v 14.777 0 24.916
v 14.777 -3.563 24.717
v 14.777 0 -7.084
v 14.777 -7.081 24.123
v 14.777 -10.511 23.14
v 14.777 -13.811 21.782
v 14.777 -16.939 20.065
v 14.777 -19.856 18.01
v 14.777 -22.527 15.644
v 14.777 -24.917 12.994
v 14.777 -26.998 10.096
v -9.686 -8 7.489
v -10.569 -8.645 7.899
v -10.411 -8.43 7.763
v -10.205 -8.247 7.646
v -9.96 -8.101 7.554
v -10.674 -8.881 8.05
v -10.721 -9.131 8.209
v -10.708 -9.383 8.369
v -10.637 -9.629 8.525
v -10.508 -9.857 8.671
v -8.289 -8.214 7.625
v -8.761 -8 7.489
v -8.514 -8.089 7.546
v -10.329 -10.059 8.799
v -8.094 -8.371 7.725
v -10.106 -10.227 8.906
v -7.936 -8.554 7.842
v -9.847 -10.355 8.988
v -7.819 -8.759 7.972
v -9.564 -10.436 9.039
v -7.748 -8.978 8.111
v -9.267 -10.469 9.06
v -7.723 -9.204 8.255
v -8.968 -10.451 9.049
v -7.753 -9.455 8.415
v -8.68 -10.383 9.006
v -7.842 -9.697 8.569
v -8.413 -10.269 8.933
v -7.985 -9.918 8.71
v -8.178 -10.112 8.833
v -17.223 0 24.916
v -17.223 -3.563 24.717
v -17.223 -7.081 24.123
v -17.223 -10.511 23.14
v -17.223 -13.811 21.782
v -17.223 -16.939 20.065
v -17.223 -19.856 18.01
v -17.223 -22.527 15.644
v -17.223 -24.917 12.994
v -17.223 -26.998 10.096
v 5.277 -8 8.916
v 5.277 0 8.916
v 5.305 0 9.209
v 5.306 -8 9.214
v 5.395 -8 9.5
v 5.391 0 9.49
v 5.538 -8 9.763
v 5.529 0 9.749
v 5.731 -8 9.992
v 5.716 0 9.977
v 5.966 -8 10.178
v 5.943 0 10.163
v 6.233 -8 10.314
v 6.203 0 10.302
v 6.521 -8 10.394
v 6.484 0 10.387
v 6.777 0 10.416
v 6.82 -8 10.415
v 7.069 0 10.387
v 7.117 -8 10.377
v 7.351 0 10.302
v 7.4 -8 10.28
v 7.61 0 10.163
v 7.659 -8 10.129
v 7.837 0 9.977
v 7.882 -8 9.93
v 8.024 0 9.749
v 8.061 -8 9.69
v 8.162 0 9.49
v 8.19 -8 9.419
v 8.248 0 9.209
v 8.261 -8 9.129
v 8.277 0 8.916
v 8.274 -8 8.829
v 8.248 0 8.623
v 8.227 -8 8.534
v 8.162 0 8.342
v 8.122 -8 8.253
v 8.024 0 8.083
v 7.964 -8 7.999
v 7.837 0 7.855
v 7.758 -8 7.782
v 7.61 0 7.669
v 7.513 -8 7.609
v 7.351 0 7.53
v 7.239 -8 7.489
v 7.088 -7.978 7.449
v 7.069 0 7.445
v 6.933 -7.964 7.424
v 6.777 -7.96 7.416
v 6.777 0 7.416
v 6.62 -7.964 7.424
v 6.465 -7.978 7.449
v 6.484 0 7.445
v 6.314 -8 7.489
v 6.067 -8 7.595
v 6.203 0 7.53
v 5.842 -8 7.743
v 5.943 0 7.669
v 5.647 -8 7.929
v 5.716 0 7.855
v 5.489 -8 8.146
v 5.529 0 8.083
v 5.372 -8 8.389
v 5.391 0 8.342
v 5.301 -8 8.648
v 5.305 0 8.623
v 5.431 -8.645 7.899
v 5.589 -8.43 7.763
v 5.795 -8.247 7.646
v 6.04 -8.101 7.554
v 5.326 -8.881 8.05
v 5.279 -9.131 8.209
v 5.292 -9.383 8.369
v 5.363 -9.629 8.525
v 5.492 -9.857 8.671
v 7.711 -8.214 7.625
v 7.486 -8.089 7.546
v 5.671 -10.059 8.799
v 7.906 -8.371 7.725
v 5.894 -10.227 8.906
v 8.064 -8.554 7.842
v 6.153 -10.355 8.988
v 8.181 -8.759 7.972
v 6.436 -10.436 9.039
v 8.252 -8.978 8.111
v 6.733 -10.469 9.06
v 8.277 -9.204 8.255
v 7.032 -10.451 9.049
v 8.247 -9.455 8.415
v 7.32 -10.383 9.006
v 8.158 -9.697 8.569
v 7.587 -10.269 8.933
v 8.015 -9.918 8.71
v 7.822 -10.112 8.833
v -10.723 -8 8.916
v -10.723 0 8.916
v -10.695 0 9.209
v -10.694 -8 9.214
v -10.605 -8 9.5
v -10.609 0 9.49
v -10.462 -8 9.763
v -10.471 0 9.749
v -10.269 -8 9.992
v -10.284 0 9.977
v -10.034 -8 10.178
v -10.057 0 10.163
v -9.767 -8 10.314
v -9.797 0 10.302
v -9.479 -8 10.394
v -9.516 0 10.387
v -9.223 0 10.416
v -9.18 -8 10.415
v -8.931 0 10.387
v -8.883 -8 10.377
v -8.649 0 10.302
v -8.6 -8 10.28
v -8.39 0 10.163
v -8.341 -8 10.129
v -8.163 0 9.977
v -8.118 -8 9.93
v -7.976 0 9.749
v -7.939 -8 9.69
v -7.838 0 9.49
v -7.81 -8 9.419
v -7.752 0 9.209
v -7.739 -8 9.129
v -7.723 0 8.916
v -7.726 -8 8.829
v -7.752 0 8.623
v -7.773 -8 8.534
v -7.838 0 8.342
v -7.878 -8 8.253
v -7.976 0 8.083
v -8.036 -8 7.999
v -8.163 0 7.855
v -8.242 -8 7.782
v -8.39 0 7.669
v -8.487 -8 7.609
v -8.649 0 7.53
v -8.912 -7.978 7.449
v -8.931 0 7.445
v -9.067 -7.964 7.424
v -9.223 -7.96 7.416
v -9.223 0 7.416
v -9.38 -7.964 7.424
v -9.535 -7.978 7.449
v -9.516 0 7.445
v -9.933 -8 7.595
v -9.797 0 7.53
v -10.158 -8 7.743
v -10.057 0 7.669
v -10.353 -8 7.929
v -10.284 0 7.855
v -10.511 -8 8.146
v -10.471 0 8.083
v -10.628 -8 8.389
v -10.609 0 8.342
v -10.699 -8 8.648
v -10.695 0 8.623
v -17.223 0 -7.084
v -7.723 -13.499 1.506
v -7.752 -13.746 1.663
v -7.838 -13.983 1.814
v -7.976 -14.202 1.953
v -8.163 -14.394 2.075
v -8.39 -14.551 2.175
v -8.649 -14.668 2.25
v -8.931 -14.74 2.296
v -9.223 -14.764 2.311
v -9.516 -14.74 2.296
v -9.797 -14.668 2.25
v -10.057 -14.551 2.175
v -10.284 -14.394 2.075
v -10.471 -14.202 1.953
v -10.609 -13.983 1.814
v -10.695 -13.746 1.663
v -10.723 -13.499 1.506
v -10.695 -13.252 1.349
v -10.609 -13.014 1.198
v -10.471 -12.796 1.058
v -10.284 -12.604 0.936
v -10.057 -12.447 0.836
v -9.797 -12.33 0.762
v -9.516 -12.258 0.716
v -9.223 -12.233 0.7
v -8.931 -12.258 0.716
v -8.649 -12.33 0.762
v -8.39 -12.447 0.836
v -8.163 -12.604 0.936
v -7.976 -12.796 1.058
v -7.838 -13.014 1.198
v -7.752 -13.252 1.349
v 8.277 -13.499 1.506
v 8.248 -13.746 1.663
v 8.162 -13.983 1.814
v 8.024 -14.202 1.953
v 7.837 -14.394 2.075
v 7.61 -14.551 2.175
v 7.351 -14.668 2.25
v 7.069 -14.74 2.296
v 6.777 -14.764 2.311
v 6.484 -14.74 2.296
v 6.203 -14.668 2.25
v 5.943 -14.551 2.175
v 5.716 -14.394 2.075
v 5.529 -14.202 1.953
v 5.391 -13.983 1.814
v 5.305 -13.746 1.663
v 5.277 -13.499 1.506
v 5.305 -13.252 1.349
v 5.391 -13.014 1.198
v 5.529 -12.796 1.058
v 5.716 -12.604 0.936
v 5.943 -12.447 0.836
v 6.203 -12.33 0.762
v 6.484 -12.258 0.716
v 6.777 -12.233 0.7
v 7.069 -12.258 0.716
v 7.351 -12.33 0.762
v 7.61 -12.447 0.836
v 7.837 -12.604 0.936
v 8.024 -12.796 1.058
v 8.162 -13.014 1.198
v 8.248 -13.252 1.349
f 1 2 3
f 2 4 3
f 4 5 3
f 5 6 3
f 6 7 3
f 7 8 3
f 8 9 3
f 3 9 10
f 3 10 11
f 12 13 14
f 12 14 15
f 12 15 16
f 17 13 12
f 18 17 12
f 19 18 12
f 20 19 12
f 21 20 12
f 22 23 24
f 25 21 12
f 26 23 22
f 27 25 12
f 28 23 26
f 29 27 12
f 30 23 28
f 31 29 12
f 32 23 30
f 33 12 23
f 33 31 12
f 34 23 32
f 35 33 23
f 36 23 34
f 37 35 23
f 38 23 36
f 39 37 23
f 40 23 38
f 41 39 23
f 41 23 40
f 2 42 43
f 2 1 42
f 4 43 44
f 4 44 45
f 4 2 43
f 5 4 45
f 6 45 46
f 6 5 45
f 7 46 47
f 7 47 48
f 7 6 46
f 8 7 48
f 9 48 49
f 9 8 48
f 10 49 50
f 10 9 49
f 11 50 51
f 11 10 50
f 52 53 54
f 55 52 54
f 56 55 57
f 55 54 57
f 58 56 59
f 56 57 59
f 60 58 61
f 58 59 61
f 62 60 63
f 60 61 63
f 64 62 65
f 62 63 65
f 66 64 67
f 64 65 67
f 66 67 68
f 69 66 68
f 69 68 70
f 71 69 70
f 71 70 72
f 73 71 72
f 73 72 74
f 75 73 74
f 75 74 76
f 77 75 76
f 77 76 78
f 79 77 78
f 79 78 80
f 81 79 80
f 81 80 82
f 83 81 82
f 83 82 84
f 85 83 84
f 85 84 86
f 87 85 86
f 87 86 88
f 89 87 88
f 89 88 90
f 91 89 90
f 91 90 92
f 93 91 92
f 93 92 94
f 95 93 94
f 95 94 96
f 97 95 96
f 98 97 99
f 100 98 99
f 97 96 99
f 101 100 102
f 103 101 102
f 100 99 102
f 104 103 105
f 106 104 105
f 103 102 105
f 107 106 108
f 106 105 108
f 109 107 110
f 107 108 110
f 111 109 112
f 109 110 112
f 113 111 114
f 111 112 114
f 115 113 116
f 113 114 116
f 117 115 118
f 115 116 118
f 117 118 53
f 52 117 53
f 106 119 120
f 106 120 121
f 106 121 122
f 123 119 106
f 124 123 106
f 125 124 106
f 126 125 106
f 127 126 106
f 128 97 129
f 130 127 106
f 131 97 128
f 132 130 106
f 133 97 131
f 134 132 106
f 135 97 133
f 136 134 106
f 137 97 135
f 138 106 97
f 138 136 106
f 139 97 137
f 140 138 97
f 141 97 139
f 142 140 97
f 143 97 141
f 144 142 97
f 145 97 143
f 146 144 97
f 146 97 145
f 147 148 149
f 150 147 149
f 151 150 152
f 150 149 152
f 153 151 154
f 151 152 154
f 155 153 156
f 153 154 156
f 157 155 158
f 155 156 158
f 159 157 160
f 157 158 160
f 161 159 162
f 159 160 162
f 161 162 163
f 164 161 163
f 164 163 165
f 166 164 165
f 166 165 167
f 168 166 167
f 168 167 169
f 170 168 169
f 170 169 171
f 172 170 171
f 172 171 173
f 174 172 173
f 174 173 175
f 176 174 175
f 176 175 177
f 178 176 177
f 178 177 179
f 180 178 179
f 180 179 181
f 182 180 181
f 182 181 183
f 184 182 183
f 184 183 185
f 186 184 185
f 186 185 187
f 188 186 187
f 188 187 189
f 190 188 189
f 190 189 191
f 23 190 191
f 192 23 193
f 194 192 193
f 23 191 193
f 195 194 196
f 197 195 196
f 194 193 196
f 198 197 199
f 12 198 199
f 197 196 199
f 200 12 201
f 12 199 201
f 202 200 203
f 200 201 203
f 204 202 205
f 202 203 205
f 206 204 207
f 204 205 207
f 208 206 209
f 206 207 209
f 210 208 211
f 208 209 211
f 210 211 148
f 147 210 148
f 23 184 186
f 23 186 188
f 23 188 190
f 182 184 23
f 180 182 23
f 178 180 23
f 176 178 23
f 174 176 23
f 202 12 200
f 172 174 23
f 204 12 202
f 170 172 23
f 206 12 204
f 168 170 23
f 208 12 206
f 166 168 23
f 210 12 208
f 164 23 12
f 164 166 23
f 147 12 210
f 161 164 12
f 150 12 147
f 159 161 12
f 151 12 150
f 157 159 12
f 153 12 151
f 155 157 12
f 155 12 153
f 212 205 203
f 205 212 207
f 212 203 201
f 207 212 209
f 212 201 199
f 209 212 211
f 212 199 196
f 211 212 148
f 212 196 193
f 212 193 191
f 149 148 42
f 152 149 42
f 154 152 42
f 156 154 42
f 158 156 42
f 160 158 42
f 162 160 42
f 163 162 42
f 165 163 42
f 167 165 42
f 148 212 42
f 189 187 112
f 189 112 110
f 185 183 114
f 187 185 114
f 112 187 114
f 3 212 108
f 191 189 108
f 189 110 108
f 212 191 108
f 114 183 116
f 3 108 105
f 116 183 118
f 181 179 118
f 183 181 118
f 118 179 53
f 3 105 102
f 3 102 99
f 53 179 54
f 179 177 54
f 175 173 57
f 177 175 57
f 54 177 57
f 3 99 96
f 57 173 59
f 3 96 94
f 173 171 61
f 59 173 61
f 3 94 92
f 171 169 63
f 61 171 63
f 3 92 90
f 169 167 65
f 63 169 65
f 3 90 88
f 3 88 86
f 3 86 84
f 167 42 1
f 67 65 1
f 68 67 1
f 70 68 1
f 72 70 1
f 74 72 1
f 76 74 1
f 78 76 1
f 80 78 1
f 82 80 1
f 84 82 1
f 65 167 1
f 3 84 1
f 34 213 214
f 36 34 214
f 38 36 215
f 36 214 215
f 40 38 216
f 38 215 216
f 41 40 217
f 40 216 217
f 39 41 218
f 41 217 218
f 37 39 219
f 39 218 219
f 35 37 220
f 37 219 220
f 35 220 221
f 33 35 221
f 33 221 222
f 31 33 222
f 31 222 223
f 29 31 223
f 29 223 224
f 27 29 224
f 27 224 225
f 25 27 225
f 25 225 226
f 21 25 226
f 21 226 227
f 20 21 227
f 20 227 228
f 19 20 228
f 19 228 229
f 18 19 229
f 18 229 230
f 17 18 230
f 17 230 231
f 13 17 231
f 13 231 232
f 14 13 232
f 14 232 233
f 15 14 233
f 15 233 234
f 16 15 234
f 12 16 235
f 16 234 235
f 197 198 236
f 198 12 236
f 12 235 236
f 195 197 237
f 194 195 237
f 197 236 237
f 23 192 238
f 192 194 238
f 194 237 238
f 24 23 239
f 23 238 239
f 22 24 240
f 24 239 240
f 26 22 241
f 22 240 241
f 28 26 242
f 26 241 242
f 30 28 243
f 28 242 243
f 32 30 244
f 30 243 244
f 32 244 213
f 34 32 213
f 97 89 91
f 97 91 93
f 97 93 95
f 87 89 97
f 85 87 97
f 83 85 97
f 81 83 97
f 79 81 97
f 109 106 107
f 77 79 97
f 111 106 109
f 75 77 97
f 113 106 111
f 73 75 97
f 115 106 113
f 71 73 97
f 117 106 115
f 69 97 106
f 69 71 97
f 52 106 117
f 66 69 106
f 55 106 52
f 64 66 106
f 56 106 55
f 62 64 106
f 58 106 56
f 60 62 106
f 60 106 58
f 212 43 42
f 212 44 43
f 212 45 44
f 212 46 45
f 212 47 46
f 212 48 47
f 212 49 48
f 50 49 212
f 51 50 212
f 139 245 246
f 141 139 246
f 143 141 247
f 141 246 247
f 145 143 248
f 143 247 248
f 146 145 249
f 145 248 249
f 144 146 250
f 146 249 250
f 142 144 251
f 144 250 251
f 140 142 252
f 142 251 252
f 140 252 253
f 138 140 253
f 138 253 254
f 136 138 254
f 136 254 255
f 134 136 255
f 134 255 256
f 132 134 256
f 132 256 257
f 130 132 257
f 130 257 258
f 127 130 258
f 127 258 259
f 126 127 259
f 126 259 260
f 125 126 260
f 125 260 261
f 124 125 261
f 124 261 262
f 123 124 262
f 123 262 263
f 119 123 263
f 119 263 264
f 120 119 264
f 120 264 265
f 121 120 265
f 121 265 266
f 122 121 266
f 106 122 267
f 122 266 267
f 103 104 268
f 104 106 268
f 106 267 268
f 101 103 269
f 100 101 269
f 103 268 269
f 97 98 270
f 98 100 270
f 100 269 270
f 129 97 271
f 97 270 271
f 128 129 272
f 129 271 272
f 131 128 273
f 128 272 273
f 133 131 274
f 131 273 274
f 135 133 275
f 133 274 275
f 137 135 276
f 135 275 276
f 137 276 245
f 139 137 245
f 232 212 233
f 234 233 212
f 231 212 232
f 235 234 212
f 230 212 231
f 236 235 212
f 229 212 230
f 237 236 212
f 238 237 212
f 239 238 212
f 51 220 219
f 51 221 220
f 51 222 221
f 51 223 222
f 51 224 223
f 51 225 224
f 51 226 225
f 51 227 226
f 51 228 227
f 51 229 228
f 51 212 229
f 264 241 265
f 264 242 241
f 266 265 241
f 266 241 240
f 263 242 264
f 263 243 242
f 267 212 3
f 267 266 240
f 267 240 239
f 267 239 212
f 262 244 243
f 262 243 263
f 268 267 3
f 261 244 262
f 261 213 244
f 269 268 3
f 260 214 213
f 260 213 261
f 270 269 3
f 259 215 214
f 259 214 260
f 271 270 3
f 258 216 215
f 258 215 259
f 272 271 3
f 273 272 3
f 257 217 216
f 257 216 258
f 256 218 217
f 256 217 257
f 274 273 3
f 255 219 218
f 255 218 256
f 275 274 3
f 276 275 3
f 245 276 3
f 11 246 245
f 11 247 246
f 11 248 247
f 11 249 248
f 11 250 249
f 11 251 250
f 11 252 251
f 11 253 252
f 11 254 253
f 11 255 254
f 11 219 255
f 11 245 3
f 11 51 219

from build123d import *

# Parameters (mm, degrees)
F0_W     = 32
F0_H     = 32
F1_ANGLE = 57.53
F2_R     = 1.5
F3_DEPTH = 8
F4_R     = 1.5
F5_DEPTH = 8


with BuildPart() as f1:
    # F0 (on Front) → F1 (revolve)
    with BuildSketch(Plane.XZ):
        with Locations((-1.223468, 8.916048)):
            Rectangle(F0_W, F0_H)
    revolve(axis=Axis((-1.223468, 0, -7.083952), (1, 0, 0)), revolution_arc=F1_ANGLE)

    # F2 (on face) → F3 (cut)
    with BuildSketch(Plane(origin=(0, 0, 0), x_dir=(-1, 0, 0), z_dir=(0, 1, 0))):
        with Locations((-6.776532, 8.916048)):
            Circle(F2_R)
        with Locations((9.223468, 8.916048)):
            Circle(F2_R)
    extrude(amount=-F3_DEPTH, mode=Mode.SUBTRACT)

    # F4 (on face) → F5 (cut)
    with BuildSketch(Plane(origin=(0, -3.208551, -5.042241), x_dir=(1, 0, 0), z_dir=(0, -0.536858, -0.843673))):
        with Locations((6.776532, 12.196924)):
            Circle(F4_R)
        with Locations((-9.223468, 12.196924)):
            Circle(F4_R)
    extrude(amount=-F5_DEPTH, mode=Mode.SUBTRACT)


solid = f1.part
